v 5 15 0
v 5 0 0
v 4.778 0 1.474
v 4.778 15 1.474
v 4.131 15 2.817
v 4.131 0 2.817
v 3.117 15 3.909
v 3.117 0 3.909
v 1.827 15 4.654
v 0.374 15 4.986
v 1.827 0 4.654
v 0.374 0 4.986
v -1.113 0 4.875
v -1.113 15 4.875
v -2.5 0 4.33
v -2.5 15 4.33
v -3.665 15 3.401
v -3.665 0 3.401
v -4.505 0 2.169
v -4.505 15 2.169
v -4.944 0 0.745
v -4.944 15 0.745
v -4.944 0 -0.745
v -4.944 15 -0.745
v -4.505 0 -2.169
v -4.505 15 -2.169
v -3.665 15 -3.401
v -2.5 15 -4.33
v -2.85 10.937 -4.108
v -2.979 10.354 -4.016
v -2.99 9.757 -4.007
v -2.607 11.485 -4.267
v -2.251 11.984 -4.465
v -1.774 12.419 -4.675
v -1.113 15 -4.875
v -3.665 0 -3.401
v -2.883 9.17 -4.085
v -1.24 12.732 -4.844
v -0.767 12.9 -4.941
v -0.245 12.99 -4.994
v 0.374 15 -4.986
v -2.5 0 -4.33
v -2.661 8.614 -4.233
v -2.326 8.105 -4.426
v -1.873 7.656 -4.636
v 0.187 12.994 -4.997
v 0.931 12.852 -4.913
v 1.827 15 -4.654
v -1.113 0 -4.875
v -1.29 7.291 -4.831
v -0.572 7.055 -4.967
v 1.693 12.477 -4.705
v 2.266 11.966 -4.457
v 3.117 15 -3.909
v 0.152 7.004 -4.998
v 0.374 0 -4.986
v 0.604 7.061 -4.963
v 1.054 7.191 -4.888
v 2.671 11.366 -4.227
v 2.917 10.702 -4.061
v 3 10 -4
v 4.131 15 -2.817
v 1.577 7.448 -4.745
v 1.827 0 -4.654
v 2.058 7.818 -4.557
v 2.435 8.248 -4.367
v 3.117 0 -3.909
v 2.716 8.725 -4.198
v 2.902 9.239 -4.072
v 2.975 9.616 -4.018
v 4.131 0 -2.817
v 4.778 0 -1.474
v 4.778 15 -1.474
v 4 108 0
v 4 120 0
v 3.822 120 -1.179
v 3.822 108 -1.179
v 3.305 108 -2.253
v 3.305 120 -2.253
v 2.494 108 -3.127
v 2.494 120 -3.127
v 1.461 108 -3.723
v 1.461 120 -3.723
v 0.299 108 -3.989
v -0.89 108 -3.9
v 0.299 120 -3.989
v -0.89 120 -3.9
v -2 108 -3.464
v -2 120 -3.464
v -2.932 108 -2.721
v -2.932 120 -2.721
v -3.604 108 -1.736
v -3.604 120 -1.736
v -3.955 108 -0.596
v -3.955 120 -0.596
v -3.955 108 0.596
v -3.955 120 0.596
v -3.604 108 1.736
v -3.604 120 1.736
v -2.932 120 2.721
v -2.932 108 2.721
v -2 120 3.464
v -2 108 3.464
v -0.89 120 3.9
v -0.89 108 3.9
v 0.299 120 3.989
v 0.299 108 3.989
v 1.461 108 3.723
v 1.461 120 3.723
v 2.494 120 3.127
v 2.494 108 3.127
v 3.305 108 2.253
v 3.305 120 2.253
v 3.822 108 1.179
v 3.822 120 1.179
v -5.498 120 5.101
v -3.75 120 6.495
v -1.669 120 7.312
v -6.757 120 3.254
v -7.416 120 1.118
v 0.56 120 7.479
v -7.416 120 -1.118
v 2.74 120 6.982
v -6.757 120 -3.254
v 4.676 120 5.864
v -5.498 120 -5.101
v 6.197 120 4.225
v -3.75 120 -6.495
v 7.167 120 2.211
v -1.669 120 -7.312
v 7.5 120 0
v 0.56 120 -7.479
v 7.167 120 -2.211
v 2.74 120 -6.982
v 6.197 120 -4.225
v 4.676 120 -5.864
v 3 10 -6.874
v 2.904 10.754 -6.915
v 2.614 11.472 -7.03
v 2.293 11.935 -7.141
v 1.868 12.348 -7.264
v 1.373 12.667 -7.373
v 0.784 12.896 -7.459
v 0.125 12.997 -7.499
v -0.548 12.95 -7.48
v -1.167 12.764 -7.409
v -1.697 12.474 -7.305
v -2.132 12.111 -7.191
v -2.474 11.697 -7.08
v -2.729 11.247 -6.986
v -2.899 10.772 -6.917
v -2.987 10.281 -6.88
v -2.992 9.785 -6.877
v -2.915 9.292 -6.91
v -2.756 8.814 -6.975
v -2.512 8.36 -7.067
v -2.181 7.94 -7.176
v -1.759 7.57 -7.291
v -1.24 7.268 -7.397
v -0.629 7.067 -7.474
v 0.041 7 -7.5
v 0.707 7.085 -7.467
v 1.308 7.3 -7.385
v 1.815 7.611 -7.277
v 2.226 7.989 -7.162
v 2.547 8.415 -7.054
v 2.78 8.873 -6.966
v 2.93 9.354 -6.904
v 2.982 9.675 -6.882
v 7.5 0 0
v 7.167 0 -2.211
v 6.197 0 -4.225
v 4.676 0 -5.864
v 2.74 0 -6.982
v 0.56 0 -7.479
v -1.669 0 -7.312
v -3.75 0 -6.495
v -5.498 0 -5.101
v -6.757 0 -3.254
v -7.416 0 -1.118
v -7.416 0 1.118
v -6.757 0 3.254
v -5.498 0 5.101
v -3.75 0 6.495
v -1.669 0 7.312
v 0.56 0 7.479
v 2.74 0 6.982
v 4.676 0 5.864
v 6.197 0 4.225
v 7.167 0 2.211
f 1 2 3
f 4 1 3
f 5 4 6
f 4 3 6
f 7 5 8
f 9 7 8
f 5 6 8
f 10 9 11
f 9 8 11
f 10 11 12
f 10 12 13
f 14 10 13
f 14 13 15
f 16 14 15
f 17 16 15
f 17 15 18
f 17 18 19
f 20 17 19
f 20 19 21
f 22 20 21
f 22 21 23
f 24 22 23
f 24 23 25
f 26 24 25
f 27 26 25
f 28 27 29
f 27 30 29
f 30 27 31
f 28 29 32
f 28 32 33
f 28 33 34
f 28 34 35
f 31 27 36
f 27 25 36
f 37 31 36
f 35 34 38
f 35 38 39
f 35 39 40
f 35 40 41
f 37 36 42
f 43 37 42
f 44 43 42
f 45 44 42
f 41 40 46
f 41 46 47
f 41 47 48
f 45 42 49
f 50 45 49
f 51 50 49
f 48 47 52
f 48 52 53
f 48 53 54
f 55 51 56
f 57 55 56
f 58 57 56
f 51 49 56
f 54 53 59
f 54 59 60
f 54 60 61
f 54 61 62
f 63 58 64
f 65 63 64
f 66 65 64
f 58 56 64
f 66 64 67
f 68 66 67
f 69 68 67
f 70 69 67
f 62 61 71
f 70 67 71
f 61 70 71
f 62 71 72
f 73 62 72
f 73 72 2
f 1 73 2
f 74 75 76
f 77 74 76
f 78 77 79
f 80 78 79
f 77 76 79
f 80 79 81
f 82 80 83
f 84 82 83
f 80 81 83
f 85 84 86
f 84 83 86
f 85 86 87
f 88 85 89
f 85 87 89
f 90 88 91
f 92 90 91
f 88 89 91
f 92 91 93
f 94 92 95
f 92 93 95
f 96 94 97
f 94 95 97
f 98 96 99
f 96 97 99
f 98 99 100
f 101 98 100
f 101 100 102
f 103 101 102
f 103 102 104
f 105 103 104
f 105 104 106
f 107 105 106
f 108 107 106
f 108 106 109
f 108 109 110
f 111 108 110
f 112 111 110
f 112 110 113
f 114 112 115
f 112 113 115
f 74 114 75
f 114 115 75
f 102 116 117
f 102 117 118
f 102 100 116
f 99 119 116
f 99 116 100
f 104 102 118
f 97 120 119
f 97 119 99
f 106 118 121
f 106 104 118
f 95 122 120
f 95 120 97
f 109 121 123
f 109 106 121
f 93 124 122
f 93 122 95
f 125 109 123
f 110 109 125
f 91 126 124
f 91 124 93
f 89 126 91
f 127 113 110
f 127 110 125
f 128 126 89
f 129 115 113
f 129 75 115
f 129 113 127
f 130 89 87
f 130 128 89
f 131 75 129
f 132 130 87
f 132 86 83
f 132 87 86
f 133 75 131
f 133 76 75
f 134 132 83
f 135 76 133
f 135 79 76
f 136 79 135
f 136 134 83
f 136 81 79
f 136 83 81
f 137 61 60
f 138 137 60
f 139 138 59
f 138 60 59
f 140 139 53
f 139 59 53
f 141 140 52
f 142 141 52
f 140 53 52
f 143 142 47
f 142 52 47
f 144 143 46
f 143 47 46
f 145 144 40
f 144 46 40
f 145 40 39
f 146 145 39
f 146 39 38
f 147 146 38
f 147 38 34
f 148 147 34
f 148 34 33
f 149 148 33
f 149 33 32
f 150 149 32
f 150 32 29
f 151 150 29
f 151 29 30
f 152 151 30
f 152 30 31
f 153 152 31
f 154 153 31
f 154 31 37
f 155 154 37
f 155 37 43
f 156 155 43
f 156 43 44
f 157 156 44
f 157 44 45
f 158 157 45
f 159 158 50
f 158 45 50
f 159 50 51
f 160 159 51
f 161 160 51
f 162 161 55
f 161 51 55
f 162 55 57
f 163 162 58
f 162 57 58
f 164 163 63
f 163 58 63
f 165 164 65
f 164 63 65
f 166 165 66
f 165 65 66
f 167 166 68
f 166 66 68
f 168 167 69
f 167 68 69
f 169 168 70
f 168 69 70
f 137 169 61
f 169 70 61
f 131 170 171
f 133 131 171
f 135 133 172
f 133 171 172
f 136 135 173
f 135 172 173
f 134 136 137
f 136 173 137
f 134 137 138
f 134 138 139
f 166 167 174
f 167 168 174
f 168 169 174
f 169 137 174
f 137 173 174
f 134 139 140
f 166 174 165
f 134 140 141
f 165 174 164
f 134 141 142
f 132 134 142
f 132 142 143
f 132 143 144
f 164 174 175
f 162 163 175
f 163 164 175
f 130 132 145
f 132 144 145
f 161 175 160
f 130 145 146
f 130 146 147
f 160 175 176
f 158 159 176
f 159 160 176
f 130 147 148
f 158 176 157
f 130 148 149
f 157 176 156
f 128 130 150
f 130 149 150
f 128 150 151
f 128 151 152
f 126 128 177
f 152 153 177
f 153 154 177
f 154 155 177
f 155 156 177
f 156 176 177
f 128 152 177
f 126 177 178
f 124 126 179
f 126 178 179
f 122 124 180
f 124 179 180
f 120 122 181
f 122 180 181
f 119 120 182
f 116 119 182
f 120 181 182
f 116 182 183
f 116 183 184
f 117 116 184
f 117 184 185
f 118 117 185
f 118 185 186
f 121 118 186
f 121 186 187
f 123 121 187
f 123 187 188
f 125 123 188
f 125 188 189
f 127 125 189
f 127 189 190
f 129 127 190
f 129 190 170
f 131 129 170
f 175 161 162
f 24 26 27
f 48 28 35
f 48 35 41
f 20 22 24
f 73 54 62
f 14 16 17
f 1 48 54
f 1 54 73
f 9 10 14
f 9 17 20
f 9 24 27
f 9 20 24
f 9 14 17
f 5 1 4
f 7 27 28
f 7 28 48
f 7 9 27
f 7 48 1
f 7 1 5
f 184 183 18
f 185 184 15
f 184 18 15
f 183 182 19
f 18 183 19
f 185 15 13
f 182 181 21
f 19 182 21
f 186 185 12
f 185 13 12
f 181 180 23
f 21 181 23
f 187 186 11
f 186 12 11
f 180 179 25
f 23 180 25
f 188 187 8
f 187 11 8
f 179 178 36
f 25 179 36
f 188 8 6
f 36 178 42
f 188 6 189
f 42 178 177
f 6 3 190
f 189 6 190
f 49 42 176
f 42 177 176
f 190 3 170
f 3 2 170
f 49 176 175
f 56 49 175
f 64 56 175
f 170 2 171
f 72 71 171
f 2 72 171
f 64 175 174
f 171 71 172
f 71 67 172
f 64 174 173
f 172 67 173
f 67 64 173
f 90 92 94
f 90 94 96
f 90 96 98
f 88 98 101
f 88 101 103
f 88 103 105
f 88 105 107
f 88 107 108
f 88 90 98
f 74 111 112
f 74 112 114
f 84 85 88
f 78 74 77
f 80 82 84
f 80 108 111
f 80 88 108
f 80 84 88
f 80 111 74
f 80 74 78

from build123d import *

# Parameters (mm, degrees)
SKETCH1_R           = 7.5
BOSS_EXTRUDE1_DEPTH = 120
SKETCH2_R           = 5
CUT_EXTRUDE1_DEPTH  = 15
SKETCH3_R           = 3
CUT_EXTRUDE4_DEPTH  = 10
SKETCH4_R           = 4
CUT_EXTRUDE5_DEPTH  = 12


with BuildPart() as part:
    # Sketch1 → Boss-Extrude1 (new body)
    with BuildSketch(Plane(origin=(0, 0, 0), x_dir=(1, 0, 0), z_dir=(0, 1, 0))):
        Circle(SKETCH1_R)
    extrude(amount=BOSS_EXTRUDE1_DEPTH)

    # Sketch2 → Cut-Extrude1 (cut)
    with BuildSketch(Plane.XZ):
        Circle(SKETCH2_R)
    extrude(amount=-CUT_EXTRUDE1_DEPTH, mode=Mode.SUBTRACT)

    # Sketch3 → Cut-Extrude4 (cut)
    with BuildSketch(Plane.XY):
        with Locations((0, 10)):
            Circle(SKETCH3_R)
    extrude(amount=-CUT_EXTRUDE4_DEPTH, mode=Mode.SUBTRACT)

    # Sketch4 → Cut-Extrude5 (cut)
    with BuildSketch(Plane(origin=(0, 120, 0), x_dir=(1, 0, 0), z_dir=(0, 1, 0))):
        Circle(SKETCH4_R)
    extrude(amount=-CUT_EXTRUDE5_DEPTH, mode=Mode.SUBTRACT)


solid = part.part
